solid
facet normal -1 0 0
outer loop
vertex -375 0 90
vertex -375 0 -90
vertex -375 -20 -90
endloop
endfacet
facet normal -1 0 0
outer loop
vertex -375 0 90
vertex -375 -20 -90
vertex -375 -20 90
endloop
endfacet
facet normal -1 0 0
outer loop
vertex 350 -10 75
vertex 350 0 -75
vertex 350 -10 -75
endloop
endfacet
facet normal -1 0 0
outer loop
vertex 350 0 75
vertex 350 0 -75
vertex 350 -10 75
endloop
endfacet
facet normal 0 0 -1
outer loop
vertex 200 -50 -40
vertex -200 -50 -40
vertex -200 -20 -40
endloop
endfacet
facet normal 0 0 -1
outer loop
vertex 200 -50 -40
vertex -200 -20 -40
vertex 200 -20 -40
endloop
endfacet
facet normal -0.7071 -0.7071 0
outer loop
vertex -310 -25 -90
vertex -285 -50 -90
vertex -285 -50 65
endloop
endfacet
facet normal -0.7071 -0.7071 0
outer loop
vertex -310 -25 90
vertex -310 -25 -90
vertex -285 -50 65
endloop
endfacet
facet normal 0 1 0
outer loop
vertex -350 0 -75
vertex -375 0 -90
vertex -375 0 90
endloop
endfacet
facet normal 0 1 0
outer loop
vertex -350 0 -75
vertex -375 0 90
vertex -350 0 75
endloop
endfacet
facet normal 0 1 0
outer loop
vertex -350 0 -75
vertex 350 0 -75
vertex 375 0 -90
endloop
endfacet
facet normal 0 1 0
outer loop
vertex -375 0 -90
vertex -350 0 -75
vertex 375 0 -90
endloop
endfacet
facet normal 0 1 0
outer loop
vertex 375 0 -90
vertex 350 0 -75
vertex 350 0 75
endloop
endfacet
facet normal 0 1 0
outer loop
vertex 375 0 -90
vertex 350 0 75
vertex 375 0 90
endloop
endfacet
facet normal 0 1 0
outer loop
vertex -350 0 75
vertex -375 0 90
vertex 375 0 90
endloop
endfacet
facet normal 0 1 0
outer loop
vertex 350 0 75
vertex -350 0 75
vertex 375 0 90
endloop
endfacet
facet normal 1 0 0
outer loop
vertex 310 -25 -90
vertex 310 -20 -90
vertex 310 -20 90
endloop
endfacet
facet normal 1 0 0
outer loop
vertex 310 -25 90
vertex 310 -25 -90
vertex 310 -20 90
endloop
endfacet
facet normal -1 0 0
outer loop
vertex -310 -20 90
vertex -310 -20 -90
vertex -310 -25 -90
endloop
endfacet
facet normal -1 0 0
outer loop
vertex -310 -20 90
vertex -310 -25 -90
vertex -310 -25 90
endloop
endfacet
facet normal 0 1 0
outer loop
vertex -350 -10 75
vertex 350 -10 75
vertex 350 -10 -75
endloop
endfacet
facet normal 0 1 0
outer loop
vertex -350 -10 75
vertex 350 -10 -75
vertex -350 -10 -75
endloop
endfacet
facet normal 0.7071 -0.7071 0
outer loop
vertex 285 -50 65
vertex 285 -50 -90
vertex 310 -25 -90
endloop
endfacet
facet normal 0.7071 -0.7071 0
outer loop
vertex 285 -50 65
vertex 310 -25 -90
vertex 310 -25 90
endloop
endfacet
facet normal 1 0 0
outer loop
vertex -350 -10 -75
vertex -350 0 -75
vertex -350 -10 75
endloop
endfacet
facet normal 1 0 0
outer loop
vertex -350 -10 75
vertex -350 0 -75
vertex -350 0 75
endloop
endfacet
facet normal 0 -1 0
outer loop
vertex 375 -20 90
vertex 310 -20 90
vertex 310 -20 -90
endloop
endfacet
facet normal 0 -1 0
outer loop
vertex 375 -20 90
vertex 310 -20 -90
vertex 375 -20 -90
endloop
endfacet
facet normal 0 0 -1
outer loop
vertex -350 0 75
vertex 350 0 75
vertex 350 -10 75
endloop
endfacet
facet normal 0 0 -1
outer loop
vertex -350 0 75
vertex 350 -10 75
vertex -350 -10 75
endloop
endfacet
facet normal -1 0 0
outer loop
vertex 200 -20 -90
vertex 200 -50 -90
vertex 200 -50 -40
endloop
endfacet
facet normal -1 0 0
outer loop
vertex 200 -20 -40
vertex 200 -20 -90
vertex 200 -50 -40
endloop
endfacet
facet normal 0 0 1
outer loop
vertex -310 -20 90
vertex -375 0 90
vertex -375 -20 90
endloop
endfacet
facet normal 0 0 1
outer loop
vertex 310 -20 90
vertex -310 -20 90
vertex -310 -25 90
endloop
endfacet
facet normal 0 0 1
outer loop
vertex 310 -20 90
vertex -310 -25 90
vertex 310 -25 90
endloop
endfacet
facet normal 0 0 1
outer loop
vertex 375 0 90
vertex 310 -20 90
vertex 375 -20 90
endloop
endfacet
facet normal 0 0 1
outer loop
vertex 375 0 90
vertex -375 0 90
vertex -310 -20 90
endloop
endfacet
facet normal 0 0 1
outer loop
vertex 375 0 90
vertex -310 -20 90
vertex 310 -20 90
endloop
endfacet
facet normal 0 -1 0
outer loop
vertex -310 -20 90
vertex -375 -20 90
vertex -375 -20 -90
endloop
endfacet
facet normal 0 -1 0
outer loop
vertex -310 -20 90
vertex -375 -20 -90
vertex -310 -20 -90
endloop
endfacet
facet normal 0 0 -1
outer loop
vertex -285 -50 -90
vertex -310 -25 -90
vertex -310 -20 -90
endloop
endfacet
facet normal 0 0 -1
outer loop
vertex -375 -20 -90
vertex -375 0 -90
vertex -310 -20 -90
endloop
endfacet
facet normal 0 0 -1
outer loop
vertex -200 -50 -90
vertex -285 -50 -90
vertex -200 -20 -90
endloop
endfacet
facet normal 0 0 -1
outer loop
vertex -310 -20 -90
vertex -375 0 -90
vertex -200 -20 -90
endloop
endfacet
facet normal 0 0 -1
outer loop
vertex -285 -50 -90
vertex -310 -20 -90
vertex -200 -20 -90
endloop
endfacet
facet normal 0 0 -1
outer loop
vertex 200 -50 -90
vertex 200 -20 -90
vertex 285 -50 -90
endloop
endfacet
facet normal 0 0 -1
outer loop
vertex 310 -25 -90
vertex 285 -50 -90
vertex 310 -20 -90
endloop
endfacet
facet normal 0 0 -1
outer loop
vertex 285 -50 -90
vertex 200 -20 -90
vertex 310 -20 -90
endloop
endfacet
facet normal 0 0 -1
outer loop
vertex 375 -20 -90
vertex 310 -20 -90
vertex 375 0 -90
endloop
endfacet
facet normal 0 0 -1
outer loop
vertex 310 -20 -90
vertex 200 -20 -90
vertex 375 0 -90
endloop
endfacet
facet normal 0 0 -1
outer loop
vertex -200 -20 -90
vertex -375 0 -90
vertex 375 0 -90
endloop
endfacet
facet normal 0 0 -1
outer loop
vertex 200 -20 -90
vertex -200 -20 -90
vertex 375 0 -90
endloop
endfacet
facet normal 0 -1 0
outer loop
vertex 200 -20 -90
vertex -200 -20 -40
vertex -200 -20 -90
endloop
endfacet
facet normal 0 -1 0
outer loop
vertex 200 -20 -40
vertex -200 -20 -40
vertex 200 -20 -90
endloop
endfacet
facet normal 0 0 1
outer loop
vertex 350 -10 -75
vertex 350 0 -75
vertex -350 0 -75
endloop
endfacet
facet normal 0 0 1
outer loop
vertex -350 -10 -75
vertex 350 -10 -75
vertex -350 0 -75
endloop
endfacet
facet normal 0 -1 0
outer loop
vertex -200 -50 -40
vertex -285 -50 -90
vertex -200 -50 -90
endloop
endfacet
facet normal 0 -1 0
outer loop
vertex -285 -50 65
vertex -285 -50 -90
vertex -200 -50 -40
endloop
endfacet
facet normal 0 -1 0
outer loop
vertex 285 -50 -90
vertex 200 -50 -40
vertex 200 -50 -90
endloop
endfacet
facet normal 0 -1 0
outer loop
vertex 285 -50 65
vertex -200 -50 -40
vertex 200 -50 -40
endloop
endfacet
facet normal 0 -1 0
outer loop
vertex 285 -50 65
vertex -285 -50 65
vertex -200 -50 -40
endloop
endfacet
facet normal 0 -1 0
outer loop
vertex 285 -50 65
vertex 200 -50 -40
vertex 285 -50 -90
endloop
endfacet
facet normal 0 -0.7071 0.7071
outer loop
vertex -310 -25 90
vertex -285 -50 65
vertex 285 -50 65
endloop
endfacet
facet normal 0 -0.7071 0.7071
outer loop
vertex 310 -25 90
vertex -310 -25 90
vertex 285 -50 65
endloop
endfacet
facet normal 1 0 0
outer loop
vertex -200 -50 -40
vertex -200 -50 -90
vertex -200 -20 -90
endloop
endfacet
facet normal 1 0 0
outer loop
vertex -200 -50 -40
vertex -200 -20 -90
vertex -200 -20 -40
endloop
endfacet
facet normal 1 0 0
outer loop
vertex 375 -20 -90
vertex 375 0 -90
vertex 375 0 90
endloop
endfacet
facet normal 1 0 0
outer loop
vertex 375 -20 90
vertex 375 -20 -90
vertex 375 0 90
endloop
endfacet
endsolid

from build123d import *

# Parameters (mm, degrees)
F0_W     = 750
F0_H     = 180
F1_DEPTH = 20
F2_W     = 620
F2_H     = 180
F3_DEPTH = 30
F4_SIZE  = 25
F5_W     = 400
F5_H     = 50
F6_DEPTH = 30
F7_W     = 700
F7_H     = 150
F8_DEPTH = 10


with BuildPart() as f1:
    # F0 (on Front) → F1 (new body)
    with BuildSketch(Plane.XZ):
        Rectangle(F0_W, F0_H)
    extrude(amount=F1_DEPTH)

    # F2 (on face) → F3 (join)
    with BuildSketch(Plane.XZ.offset(20)):
        Rectangle(F2_W, F2_H)
    extrude(amount=F3_DEPTH)

    # F4
    f4_edges = [f1.edges().sort_by_distance(p)[0] for p in [
        (0, -50, 90),
        (-310, -50, 0),
        (310, -50, 0),
    ]]
    chamfer(f4_edges, length=F4_SIZE)

    # F5 (on face) → F6 (cut)
    with BuildSketch(Plane.XZ.offset(50)):
        with Locations((0, -65)):
            Rectangle(F5_W, F5_H)
    extrude(amount=-F6_DEPTH, mode=Mode.SUBTRACT)

    # F7 (on face) → F8 (cut)
    with BuildSketch(Plane(origin=(0, 0, 0), x_dir=(-1, 0, 0), z_dir=(0, 1, 0))):
        Rectangle(F7_W, F7_H)
    extrude(amount=-F8_DEPTH, mode=Mode.SUBTRACT)


solid = f1.part
